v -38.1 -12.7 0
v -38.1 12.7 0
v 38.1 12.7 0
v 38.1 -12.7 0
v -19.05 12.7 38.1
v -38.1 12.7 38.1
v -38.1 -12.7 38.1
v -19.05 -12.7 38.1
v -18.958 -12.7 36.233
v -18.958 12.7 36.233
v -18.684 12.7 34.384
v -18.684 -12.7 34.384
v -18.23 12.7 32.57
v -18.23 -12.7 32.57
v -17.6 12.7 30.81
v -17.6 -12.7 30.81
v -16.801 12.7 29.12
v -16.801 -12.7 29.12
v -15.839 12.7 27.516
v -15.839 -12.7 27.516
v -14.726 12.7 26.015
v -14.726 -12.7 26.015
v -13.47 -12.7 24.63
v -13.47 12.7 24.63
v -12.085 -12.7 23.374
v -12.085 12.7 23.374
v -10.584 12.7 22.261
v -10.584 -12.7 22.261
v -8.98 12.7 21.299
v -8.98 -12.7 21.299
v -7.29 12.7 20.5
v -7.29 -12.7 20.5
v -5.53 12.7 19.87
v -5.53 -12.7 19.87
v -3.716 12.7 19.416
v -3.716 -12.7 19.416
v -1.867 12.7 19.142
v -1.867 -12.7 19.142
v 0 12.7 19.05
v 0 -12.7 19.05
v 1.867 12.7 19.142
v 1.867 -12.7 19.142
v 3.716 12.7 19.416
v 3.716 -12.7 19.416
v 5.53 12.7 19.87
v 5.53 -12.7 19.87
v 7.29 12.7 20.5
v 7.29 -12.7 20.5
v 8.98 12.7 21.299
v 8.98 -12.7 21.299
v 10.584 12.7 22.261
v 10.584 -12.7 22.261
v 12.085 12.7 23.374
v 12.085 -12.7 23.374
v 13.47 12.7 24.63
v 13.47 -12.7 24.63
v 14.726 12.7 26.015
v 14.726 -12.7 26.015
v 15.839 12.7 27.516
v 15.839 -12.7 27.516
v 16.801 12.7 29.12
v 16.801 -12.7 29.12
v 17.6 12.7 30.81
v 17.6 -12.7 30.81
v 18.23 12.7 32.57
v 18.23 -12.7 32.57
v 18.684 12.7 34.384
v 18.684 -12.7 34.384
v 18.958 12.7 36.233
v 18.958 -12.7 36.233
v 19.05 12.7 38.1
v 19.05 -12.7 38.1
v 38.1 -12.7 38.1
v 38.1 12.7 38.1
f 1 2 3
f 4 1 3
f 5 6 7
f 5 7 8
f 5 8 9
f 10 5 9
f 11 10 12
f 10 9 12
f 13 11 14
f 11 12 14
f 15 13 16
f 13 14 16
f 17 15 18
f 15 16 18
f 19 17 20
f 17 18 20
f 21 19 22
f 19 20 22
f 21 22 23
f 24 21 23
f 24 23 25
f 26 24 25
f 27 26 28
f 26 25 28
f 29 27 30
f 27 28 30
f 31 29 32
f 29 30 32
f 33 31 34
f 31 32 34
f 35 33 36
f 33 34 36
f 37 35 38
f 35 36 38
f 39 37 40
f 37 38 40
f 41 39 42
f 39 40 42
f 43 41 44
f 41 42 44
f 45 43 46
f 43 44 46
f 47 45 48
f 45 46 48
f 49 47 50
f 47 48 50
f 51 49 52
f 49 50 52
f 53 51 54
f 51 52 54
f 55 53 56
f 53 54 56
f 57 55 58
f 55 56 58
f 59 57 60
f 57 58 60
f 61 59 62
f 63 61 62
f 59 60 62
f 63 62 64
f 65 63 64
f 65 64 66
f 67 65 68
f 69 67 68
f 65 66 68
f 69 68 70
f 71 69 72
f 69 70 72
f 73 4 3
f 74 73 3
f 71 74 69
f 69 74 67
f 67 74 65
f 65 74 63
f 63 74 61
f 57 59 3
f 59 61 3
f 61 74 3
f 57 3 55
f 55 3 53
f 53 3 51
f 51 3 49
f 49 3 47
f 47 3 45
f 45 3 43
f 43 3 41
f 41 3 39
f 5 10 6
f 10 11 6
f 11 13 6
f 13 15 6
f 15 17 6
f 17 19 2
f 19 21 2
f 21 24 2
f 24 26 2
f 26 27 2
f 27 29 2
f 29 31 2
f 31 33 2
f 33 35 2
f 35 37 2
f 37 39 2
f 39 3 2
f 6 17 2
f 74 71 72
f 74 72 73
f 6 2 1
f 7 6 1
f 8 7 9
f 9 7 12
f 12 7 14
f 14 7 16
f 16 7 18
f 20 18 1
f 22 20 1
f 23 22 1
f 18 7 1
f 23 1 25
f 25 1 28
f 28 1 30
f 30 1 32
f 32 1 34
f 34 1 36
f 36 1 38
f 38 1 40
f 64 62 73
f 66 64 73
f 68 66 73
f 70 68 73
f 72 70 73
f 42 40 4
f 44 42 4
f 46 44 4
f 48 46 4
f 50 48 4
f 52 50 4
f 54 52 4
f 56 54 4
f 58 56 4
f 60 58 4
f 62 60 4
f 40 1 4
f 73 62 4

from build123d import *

# Parameters (mm, degrees)
F1_DEPTH = 38.1
F3_DEPTH = 25.4


with BuildPart() as f1:
    # F0 (on Top) → F1 (new body)
    with BuildSketch(Plane.XY):
        Polygon((-38.1, 12.7), (-38.1, 0), (-38.1, -12.7), (0, -12.7), (38.1, -12.7), (38.1, 0), (38.1, 12.7), (0, 12.7), align=None)
    extrude(amount=F1_DEPTH)

    # F2 (on face) → F3 (cut)
    with BuildSketch(Plane.XZ.offset(12.7)):
        with BuildLine():
            Line((19.05, 38.1), (-19.05, 38.1))
            ThreePointArc((-19.05, 38.1), (0, 19.05), (19.05, 38.1))
        make_face()
    extrude(amount=-F3_DEPTH, mode=Mode.SUBTRACT)


solid = f1.part
